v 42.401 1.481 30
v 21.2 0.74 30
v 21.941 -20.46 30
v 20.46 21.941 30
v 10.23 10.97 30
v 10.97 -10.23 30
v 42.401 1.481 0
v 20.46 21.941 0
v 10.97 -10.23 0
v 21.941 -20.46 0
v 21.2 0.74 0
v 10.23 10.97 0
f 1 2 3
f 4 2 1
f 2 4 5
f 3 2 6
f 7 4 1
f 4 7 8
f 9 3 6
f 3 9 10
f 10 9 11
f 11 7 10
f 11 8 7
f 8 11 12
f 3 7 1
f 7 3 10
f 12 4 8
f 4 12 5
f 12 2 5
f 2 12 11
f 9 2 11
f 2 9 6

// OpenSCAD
rotate([0,0,-88])
rotate([0,-90,0]){
    difference(){
        rotate([-45,0,0]) {
            cube([30, 30, 30]);
        }
        scale([1,0.5,0.5]) {
            rotate([-45,0,0]) {
                cube([30, 30, 30]);
            }
        }
    }
}
